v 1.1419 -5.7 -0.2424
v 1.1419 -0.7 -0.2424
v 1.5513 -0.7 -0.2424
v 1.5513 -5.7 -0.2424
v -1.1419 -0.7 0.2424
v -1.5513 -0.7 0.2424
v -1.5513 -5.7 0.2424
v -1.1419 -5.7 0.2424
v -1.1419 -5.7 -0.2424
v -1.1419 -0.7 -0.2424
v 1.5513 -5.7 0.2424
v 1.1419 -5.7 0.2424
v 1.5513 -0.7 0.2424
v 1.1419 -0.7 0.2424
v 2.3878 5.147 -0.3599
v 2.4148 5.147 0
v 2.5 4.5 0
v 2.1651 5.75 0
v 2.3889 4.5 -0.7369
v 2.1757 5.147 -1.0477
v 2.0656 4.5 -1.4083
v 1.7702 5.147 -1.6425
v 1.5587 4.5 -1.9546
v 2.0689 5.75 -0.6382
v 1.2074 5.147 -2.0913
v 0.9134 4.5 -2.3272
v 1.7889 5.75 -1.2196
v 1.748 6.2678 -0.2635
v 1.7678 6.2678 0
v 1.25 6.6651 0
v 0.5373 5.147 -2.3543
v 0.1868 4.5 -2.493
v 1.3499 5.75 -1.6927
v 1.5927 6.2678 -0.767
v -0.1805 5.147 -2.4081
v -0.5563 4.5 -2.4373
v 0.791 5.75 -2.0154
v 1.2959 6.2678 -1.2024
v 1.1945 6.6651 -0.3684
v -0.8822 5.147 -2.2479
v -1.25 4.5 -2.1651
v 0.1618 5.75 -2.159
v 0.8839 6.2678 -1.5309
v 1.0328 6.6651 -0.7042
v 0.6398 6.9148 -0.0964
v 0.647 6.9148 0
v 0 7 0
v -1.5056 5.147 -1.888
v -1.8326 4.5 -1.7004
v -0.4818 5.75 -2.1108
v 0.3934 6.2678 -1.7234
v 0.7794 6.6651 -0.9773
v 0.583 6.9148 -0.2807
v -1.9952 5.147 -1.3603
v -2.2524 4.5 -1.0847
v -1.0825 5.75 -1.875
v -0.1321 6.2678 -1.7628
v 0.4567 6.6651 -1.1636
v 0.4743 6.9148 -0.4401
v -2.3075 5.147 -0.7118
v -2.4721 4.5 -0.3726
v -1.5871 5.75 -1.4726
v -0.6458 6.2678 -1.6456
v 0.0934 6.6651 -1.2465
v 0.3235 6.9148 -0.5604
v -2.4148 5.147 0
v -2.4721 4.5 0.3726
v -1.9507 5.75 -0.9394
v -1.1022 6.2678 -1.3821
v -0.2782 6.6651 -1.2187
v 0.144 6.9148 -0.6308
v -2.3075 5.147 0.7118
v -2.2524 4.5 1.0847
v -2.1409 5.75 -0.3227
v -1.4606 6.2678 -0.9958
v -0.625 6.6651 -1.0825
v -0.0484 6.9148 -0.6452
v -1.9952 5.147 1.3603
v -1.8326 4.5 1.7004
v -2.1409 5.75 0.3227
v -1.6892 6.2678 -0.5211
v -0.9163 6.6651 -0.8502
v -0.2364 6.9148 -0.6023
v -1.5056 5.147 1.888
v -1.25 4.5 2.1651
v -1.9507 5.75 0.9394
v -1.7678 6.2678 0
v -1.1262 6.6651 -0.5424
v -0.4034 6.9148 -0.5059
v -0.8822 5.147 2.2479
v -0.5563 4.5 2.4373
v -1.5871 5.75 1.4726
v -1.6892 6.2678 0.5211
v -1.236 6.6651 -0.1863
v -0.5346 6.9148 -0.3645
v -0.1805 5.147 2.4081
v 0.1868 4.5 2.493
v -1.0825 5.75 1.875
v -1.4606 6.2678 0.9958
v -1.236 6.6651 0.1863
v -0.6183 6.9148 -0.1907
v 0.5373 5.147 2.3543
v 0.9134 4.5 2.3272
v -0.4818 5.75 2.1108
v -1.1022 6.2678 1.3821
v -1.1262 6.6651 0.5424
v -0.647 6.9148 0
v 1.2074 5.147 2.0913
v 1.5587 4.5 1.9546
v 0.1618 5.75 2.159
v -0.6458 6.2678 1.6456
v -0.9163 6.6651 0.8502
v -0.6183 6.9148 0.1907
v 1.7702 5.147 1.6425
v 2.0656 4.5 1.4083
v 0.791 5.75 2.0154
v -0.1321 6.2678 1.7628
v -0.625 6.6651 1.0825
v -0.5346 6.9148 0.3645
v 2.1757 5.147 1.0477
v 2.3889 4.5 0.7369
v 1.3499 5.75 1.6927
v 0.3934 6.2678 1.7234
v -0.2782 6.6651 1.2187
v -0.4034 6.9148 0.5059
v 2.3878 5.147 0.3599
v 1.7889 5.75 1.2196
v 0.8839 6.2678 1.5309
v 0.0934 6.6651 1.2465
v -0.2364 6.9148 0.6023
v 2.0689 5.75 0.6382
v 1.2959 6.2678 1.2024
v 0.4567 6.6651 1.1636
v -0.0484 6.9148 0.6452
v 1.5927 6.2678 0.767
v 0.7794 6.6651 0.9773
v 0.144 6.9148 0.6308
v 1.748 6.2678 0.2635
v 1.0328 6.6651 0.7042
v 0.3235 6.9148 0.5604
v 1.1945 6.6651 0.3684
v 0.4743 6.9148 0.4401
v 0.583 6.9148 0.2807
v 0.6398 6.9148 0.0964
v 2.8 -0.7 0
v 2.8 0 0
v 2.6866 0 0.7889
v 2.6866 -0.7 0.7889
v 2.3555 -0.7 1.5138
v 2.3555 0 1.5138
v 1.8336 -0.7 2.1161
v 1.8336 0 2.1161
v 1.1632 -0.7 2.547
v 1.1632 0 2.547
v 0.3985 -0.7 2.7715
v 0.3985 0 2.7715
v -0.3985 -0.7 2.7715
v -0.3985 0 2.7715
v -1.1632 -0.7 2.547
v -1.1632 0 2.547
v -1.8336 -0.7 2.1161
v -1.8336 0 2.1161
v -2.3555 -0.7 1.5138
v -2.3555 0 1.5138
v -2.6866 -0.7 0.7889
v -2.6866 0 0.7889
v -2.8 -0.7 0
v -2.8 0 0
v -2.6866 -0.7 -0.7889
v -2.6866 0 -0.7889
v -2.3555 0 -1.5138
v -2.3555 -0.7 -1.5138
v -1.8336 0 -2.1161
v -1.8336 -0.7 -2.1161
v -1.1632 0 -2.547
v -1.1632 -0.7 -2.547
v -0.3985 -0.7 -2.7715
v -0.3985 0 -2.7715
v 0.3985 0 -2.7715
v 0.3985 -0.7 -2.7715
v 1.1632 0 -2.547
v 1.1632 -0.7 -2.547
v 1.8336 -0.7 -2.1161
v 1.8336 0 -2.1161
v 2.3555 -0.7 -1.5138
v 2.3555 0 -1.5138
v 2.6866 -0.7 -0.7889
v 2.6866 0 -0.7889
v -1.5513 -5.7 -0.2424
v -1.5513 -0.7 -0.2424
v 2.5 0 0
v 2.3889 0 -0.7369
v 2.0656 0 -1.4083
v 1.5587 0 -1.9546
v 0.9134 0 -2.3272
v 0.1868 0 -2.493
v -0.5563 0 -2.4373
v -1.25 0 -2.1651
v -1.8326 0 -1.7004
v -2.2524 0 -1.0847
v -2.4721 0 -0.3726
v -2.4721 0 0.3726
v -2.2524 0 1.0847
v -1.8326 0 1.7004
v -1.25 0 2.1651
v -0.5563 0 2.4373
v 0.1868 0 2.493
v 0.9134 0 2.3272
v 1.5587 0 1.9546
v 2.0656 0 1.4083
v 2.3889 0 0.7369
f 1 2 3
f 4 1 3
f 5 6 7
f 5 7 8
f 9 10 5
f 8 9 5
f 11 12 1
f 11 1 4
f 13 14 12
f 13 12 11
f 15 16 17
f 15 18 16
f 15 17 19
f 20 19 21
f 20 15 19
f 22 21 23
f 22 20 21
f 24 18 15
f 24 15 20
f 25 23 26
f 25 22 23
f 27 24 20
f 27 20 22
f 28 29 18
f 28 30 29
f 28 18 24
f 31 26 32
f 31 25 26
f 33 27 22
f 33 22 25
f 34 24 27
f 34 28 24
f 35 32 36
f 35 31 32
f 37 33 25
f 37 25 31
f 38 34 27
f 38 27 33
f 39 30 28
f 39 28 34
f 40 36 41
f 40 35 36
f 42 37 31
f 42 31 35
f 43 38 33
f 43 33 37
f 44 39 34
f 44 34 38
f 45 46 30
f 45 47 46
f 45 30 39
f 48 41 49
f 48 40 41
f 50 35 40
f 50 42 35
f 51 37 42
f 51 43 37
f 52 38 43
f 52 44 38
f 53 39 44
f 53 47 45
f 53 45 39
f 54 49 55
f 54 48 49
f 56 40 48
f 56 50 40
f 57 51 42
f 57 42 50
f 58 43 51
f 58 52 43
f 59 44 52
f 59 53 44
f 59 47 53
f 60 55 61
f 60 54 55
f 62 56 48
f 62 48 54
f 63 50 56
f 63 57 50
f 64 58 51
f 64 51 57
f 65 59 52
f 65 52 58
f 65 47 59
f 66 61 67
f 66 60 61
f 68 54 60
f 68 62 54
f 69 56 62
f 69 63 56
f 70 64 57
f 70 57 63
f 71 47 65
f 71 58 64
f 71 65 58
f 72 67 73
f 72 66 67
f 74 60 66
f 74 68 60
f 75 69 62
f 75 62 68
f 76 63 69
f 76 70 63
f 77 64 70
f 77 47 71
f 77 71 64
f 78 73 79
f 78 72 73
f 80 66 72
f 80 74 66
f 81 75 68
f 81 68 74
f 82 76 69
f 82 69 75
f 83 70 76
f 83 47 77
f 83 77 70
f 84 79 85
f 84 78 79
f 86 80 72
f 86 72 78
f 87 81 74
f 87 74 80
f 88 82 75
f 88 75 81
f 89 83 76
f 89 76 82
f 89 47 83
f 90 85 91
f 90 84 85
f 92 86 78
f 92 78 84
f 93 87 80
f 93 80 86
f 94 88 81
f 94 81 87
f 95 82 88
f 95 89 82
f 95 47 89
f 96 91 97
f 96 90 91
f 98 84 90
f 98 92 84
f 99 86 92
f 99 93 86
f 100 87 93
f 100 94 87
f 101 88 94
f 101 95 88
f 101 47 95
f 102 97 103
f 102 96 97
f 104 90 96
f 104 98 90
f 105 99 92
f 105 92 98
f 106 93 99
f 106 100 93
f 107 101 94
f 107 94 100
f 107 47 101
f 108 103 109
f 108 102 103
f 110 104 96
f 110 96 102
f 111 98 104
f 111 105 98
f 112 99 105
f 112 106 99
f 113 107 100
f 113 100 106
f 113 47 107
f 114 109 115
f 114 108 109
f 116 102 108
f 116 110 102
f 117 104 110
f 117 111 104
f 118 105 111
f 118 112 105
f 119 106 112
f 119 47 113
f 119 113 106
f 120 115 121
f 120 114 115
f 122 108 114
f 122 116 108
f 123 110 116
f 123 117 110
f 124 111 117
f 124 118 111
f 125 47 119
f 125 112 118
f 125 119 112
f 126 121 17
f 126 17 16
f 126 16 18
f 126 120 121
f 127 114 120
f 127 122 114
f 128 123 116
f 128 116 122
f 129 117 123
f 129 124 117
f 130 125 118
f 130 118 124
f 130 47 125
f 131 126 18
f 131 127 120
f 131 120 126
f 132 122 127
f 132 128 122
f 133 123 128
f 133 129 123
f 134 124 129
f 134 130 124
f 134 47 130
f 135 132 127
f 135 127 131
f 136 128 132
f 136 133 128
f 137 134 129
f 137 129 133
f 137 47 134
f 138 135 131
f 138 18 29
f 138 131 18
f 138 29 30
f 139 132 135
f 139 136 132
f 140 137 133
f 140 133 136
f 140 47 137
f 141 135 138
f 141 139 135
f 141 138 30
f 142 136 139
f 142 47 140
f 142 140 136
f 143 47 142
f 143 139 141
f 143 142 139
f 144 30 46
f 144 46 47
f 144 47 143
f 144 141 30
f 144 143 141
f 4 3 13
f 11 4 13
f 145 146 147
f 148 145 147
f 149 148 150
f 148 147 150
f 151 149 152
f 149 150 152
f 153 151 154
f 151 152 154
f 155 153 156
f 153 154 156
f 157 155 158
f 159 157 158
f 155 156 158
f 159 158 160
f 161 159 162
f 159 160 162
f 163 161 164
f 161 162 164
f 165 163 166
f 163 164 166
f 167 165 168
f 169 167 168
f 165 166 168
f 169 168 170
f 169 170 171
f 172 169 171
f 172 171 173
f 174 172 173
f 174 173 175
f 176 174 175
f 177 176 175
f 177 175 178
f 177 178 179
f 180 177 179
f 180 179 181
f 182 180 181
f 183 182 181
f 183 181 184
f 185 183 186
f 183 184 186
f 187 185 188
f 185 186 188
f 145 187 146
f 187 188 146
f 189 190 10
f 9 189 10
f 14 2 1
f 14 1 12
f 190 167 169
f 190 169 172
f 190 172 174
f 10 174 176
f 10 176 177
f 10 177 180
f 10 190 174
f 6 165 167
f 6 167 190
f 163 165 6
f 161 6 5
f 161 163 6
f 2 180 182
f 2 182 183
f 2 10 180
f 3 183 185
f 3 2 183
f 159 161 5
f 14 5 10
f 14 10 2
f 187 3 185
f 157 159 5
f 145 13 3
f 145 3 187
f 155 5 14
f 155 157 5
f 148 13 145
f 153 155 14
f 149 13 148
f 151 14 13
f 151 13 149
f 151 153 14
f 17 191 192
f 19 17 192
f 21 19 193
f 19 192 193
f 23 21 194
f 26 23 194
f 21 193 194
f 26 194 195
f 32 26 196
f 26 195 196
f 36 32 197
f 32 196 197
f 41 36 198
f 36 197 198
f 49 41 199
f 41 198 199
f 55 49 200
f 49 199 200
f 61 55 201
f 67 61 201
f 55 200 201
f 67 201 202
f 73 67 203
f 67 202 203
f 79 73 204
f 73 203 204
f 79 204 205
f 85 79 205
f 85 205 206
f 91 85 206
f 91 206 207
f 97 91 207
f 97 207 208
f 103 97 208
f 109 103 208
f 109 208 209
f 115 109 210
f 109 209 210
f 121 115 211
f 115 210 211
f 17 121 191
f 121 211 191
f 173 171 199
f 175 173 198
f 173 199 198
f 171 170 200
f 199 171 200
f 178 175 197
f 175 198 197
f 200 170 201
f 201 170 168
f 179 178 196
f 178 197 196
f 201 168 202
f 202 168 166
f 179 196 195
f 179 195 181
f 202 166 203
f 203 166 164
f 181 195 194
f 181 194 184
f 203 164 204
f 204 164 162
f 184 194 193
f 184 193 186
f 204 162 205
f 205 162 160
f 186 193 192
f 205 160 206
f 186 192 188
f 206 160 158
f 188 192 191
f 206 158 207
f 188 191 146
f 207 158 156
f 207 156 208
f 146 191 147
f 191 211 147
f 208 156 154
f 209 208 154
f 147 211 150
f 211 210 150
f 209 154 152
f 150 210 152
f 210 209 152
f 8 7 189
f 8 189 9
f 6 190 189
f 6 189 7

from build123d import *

# Parameters (mm, degrees)
SKETCH2_R           = 2.5
BOSS_EXTRUDE1_DEPTH = 7
SKETCH3_R           = 2.8
BOSS_EXTRUDE2_DEPTH = 0.7
FILLET1_R           = 2.5
SKETCH4_W           = 0.409361502
SKETCH4_H           = 0.4847702
BOSS_EXTRUDE3_DEPTH = 5


with BuildPart() as part:
    # Sketch2 → Boss-Extrude1 (new body)
    with BuildSketch(Plane(origin=(0, 0, 0), x_dir=(1, 0, 0), z_dir=(0, 1, 0))):
        Circle(SKETCH2_R)
    extrude(amount=BOSS_EXTRUDE1_DEPTH)

    # Sketch3 → Boss-Extrude2 (add)
    with BuildSketch(Plane.XZ):
        Circle(SKETCH3_R)
    extrude(amount=BOSS_EXTRUDE2_DEPTH)

    # Fillet1
    fillet1_edges = [part.edges().sort_by_distance(p)[0] for p in [
        (-2.5, 7, 0),
    ]]
    fillet(fillet1_edges, radius=FILLET1_R)

    # Sketch4 → Boss-Extrude3 (add)
    with BuildSketch(Plane.XZ.offset(0.7)):
        with Locations((1.346583888, 0)):
            Rectangle(SKETCH4_W, SKETCH4_H)
        with Locations((-1.346583888, 0)):
            Rectangle(SKETCH4_W, SKETCH4_H)
    extrude(amount=BOSS_EXTRUDE3_DEPTH)


solid = part.part
